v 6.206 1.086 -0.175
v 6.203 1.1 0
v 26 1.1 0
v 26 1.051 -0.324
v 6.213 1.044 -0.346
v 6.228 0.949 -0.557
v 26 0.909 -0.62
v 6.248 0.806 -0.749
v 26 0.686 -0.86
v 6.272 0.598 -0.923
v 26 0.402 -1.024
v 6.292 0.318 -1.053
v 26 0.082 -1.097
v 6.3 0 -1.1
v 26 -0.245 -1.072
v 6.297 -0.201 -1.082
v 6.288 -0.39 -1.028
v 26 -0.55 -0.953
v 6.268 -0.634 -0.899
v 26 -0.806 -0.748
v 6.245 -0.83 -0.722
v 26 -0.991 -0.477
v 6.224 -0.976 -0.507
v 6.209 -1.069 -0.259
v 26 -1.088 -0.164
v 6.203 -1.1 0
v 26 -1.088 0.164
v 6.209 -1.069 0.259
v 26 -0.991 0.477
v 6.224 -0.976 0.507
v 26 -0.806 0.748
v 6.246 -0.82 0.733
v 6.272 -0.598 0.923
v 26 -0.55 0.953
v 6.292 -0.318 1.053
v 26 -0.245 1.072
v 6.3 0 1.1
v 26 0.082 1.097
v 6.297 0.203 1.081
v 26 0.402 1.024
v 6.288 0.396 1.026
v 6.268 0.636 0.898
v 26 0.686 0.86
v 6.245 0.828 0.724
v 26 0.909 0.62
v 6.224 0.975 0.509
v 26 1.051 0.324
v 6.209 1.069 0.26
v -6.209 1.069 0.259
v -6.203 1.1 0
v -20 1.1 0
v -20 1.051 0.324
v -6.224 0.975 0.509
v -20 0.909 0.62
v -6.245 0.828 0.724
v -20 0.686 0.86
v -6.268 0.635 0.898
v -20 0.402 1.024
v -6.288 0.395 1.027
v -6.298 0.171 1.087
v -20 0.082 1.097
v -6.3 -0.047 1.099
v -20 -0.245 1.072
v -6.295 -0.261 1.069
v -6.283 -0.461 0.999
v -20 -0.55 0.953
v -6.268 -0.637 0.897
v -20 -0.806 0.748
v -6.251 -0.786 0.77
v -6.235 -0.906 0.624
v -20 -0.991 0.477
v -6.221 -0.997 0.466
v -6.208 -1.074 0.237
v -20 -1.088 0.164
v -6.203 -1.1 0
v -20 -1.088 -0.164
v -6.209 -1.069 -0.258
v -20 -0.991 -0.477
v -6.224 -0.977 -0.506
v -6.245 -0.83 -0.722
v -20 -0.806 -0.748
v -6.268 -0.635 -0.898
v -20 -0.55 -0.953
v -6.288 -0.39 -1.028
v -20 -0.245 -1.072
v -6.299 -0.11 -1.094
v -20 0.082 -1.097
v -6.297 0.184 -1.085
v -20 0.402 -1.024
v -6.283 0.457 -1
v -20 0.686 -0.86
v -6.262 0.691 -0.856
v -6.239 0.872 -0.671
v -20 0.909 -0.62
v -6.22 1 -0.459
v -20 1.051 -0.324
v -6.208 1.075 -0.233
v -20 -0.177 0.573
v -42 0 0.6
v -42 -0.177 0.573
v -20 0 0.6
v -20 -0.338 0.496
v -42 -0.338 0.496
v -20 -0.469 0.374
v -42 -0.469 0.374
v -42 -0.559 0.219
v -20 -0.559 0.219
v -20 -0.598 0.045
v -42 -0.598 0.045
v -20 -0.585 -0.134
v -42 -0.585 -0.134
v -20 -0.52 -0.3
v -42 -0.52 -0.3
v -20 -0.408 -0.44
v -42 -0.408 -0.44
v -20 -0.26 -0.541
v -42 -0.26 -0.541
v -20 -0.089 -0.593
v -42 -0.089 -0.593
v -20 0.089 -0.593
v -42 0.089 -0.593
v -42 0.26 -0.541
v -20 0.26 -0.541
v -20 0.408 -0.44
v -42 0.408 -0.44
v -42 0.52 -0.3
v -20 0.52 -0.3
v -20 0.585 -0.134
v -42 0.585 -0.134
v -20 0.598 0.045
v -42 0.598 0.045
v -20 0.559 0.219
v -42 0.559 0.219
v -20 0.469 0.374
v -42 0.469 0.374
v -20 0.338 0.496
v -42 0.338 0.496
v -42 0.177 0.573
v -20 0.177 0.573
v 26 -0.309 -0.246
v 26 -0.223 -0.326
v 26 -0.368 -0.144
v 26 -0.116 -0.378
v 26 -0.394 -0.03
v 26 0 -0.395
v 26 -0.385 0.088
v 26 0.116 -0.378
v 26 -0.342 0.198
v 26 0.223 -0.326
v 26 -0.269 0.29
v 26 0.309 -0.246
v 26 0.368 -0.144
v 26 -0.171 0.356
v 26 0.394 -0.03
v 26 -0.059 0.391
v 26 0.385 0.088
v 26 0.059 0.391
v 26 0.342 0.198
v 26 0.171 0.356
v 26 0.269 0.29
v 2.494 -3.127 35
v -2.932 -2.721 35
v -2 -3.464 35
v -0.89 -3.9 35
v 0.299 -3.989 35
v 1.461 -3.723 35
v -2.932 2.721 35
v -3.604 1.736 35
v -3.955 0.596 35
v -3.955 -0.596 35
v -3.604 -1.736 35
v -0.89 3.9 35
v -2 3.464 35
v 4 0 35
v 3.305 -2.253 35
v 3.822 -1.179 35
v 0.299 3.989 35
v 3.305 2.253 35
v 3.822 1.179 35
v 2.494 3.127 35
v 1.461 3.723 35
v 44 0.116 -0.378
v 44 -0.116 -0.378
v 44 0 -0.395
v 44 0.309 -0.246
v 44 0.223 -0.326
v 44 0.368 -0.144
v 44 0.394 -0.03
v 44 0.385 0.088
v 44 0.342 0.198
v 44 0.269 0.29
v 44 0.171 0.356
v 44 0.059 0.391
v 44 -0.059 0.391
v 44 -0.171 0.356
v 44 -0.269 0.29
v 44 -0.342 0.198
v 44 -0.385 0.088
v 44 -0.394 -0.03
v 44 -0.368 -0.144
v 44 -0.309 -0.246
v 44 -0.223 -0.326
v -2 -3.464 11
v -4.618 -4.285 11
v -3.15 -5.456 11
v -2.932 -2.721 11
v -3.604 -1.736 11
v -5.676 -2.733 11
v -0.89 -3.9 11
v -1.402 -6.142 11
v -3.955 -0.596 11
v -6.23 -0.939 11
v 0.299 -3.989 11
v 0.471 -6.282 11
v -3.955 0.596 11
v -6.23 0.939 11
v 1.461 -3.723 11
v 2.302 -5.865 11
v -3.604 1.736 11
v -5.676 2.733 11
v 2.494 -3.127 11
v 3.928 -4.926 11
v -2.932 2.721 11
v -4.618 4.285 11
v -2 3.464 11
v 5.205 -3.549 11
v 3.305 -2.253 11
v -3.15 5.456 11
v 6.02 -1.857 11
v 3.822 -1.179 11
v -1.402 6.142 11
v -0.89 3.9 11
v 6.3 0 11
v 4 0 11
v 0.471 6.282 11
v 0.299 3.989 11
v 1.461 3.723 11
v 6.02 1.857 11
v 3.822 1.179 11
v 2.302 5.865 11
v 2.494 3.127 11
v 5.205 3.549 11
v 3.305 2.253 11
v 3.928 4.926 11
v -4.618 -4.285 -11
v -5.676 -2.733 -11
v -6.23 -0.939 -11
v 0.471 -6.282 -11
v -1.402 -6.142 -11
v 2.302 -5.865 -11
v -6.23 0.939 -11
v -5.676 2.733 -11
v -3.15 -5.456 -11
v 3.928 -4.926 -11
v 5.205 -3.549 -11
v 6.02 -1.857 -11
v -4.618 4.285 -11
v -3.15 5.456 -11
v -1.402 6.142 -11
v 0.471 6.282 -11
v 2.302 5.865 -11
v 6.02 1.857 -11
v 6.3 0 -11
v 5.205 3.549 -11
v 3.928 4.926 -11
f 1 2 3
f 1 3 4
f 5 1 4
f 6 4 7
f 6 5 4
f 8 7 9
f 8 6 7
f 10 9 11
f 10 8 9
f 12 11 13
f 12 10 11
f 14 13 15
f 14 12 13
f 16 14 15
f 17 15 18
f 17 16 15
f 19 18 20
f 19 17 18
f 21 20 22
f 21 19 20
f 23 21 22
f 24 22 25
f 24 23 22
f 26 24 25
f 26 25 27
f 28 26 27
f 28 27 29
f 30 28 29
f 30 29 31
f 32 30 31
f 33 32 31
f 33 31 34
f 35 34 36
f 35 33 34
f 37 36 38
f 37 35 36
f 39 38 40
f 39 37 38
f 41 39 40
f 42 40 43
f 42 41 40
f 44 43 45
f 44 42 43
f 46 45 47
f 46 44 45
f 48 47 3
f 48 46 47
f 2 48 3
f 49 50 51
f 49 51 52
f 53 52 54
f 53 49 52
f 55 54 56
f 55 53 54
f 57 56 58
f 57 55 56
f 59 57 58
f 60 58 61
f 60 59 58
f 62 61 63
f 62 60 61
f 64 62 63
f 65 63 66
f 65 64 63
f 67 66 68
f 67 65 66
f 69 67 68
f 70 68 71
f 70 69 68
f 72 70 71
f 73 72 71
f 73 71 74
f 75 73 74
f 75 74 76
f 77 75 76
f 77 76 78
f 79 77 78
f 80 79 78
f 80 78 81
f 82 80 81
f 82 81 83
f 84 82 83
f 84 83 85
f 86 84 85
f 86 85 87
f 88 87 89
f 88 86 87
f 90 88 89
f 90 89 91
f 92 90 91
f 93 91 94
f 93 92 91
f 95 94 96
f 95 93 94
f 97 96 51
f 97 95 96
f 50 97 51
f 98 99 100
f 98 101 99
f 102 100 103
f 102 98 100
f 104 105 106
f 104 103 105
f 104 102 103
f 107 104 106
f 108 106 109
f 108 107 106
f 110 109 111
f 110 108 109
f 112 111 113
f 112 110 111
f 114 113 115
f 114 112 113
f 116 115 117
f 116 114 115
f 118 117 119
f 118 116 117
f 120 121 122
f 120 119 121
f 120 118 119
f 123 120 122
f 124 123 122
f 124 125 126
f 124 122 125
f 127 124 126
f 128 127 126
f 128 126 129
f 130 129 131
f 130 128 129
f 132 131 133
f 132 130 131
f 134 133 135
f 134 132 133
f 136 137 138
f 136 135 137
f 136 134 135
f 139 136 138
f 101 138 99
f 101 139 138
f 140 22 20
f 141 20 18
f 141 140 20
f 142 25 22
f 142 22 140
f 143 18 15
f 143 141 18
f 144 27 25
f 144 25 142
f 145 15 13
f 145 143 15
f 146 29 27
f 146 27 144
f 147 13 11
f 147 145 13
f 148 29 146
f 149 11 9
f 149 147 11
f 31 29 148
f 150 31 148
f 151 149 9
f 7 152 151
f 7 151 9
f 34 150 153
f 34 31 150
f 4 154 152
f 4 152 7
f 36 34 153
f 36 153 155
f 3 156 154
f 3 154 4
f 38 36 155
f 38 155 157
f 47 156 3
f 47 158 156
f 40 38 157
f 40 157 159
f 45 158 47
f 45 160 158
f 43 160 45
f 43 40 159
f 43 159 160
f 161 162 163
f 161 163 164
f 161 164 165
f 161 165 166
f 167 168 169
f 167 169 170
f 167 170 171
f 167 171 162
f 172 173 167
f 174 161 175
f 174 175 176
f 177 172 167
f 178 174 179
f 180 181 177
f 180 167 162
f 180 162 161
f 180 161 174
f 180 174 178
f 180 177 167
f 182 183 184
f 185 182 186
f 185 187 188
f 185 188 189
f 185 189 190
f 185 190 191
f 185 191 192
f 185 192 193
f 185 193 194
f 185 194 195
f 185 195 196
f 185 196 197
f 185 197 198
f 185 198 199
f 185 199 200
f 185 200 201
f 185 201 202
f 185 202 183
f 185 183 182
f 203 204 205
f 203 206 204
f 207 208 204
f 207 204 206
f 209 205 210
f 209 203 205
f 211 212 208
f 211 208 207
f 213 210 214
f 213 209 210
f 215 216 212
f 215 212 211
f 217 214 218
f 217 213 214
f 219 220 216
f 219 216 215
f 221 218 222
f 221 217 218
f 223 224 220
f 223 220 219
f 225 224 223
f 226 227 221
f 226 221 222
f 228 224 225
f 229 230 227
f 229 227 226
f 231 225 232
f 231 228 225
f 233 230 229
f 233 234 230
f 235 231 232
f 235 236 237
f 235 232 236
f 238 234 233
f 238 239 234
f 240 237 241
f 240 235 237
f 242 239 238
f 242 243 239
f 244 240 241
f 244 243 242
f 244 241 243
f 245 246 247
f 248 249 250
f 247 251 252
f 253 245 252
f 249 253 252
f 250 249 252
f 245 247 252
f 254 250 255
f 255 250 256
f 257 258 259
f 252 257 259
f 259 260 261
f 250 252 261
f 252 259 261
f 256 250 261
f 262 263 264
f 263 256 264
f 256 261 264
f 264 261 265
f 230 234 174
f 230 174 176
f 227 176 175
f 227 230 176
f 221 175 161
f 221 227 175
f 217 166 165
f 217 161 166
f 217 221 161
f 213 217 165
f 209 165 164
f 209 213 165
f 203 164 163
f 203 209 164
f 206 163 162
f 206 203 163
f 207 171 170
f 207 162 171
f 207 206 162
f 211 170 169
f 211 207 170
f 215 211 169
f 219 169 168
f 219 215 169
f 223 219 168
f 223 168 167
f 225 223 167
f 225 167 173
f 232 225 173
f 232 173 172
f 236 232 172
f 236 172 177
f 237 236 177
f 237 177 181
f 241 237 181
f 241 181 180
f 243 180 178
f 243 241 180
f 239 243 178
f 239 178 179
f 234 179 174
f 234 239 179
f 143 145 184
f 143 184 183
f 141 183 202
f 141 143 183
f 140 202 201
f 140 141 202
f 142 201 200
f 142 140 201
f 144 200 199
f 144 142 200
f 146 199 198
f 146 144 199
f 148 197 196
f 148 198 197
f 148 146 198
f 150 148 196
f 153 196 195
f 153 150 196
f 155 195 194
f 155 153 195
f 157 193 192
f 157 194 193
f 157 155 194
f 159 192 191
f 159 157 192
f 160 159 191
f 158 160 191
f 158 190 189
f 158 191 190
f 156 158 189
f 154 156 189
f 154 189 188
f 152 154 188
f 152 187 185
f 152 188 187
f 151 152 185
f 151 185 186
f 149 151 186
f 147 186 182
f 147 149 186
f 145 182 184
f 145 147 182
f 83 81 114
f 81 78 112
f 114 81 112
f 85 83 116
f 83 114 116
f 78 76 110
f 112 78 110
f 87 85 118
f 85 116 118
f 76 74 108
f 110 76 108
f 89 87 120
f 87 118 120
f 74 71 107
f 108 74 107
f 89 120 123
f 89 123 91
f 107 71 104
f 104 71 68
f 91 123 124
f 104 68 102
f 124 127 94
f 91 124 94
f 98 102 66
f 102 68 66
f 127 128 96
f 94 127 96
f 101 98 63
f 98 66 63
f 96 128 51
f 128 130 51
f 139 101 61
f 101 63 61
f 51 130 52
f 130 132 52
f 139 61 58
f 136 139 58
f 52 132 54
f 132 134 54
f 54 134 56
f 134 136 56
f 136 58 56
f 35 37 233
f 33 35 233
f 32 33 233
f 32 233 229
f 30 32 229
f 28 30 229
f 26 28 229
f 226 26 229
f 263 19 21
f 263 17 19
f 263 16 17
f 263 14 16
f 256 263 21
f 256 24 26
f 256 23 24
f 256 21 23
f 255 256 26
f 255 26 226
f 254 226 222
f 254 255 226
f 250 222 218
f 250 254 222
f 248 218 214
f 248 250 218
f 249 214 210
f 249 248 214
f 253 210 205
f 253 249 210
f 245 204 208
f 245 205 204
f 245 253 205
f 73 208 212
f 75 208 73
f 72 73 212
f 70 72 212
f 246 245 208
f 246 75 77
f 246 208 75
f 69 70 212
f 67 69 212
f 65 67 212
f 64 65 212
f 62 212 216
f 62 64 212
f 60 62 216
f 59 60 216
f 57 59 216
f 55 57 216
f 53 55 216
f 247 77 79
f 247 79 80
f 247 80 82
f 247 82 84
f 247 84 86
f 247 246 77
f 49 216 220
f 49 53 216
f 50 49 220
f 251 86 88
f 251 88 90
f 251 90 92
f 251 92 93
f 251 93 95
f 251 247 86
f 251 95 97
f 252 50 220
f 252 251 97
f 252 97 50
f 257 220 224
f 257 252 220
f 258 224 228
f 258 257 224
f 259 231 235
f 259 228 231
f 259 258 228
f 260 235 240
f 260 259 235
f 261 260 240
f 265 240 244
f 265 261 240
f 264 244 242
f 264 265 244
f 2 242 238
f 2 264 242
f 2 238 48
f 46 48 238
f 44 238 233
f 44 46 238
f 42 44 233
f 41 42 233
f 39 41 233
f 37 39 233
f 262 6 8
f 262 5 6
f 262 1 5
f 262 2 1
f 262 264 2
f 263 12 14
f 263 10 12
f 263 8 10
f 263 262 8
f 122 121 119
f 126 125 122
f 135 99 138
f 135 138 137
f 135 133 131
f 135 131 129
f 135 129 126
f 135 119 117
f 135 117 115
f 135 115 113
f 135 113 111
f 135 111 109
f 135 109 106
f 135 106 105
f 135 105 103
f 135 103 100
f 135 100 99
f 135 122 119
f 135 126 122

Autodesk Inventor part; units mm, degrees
ref_plane "YZ Plane" through (0, 0, 0) normal (1, 0, 0) x (0, 1, 0)
ref_plane "XZ Plane" through (0, 0, 0) normal (0, 1, 0) x (-1, 0, 0)
ref_plane "XY Plane" through (0, 0, 0) normal (0, 0, 1) x (1, 0, 0)
sketch "Skizze1" plane through (0, 0, 0) normal (0, 0, 1) x (1, 0, 0)
  circle A0 centre (0, 0) radius 6.3
  dimension "d0" = 12.6
extrude "Extrusion1" add sketch "Skizze1" along normal mid plane 22
sketch "Skizze2" plane through (0, 0, 11) normal (0, 0, 1) x (1, 0, 0)
  circle A0 centre (0, 0) radius 6.3 projected
  circle A1 centre (0, 0) radius 4
  dimension "d3" = 8
extrude "Extrusion2" add sketch "Skizze2" along normal blind 24 contours A1
sketch "Skizze3" plane through (0, 0, 0) normal (1, 0, 0) x (0, 1, 0)
  circle A0 centre (0, 0) radius 1.1
  dimension "d6" = 2.2
extrude "Extrusion3" add sketch "Skizze3" along normal blind 26 and the other way blind 20
sketch "Skizze4" plane through (26, 0, 0) normal (1, 0, 0) x (0, 0, -1)
  circle A0 centre (0, 0) radius 0.3951
extrude "Extrusion4" add sketch "Skizze4" along normal blind 18
sketch "Skizze5" plane through (-20, 0, 0) normal (-1, 0, 0) x (0, 0, 1)
  circle A0 centre (0, 0) radius 0.6
  dimension "d13" = 1.2
extrude "Extrusion5" add sketch "Skizze5" along normal blind 22
properties part number "Probenkammer-Dummy" material "Glas"
